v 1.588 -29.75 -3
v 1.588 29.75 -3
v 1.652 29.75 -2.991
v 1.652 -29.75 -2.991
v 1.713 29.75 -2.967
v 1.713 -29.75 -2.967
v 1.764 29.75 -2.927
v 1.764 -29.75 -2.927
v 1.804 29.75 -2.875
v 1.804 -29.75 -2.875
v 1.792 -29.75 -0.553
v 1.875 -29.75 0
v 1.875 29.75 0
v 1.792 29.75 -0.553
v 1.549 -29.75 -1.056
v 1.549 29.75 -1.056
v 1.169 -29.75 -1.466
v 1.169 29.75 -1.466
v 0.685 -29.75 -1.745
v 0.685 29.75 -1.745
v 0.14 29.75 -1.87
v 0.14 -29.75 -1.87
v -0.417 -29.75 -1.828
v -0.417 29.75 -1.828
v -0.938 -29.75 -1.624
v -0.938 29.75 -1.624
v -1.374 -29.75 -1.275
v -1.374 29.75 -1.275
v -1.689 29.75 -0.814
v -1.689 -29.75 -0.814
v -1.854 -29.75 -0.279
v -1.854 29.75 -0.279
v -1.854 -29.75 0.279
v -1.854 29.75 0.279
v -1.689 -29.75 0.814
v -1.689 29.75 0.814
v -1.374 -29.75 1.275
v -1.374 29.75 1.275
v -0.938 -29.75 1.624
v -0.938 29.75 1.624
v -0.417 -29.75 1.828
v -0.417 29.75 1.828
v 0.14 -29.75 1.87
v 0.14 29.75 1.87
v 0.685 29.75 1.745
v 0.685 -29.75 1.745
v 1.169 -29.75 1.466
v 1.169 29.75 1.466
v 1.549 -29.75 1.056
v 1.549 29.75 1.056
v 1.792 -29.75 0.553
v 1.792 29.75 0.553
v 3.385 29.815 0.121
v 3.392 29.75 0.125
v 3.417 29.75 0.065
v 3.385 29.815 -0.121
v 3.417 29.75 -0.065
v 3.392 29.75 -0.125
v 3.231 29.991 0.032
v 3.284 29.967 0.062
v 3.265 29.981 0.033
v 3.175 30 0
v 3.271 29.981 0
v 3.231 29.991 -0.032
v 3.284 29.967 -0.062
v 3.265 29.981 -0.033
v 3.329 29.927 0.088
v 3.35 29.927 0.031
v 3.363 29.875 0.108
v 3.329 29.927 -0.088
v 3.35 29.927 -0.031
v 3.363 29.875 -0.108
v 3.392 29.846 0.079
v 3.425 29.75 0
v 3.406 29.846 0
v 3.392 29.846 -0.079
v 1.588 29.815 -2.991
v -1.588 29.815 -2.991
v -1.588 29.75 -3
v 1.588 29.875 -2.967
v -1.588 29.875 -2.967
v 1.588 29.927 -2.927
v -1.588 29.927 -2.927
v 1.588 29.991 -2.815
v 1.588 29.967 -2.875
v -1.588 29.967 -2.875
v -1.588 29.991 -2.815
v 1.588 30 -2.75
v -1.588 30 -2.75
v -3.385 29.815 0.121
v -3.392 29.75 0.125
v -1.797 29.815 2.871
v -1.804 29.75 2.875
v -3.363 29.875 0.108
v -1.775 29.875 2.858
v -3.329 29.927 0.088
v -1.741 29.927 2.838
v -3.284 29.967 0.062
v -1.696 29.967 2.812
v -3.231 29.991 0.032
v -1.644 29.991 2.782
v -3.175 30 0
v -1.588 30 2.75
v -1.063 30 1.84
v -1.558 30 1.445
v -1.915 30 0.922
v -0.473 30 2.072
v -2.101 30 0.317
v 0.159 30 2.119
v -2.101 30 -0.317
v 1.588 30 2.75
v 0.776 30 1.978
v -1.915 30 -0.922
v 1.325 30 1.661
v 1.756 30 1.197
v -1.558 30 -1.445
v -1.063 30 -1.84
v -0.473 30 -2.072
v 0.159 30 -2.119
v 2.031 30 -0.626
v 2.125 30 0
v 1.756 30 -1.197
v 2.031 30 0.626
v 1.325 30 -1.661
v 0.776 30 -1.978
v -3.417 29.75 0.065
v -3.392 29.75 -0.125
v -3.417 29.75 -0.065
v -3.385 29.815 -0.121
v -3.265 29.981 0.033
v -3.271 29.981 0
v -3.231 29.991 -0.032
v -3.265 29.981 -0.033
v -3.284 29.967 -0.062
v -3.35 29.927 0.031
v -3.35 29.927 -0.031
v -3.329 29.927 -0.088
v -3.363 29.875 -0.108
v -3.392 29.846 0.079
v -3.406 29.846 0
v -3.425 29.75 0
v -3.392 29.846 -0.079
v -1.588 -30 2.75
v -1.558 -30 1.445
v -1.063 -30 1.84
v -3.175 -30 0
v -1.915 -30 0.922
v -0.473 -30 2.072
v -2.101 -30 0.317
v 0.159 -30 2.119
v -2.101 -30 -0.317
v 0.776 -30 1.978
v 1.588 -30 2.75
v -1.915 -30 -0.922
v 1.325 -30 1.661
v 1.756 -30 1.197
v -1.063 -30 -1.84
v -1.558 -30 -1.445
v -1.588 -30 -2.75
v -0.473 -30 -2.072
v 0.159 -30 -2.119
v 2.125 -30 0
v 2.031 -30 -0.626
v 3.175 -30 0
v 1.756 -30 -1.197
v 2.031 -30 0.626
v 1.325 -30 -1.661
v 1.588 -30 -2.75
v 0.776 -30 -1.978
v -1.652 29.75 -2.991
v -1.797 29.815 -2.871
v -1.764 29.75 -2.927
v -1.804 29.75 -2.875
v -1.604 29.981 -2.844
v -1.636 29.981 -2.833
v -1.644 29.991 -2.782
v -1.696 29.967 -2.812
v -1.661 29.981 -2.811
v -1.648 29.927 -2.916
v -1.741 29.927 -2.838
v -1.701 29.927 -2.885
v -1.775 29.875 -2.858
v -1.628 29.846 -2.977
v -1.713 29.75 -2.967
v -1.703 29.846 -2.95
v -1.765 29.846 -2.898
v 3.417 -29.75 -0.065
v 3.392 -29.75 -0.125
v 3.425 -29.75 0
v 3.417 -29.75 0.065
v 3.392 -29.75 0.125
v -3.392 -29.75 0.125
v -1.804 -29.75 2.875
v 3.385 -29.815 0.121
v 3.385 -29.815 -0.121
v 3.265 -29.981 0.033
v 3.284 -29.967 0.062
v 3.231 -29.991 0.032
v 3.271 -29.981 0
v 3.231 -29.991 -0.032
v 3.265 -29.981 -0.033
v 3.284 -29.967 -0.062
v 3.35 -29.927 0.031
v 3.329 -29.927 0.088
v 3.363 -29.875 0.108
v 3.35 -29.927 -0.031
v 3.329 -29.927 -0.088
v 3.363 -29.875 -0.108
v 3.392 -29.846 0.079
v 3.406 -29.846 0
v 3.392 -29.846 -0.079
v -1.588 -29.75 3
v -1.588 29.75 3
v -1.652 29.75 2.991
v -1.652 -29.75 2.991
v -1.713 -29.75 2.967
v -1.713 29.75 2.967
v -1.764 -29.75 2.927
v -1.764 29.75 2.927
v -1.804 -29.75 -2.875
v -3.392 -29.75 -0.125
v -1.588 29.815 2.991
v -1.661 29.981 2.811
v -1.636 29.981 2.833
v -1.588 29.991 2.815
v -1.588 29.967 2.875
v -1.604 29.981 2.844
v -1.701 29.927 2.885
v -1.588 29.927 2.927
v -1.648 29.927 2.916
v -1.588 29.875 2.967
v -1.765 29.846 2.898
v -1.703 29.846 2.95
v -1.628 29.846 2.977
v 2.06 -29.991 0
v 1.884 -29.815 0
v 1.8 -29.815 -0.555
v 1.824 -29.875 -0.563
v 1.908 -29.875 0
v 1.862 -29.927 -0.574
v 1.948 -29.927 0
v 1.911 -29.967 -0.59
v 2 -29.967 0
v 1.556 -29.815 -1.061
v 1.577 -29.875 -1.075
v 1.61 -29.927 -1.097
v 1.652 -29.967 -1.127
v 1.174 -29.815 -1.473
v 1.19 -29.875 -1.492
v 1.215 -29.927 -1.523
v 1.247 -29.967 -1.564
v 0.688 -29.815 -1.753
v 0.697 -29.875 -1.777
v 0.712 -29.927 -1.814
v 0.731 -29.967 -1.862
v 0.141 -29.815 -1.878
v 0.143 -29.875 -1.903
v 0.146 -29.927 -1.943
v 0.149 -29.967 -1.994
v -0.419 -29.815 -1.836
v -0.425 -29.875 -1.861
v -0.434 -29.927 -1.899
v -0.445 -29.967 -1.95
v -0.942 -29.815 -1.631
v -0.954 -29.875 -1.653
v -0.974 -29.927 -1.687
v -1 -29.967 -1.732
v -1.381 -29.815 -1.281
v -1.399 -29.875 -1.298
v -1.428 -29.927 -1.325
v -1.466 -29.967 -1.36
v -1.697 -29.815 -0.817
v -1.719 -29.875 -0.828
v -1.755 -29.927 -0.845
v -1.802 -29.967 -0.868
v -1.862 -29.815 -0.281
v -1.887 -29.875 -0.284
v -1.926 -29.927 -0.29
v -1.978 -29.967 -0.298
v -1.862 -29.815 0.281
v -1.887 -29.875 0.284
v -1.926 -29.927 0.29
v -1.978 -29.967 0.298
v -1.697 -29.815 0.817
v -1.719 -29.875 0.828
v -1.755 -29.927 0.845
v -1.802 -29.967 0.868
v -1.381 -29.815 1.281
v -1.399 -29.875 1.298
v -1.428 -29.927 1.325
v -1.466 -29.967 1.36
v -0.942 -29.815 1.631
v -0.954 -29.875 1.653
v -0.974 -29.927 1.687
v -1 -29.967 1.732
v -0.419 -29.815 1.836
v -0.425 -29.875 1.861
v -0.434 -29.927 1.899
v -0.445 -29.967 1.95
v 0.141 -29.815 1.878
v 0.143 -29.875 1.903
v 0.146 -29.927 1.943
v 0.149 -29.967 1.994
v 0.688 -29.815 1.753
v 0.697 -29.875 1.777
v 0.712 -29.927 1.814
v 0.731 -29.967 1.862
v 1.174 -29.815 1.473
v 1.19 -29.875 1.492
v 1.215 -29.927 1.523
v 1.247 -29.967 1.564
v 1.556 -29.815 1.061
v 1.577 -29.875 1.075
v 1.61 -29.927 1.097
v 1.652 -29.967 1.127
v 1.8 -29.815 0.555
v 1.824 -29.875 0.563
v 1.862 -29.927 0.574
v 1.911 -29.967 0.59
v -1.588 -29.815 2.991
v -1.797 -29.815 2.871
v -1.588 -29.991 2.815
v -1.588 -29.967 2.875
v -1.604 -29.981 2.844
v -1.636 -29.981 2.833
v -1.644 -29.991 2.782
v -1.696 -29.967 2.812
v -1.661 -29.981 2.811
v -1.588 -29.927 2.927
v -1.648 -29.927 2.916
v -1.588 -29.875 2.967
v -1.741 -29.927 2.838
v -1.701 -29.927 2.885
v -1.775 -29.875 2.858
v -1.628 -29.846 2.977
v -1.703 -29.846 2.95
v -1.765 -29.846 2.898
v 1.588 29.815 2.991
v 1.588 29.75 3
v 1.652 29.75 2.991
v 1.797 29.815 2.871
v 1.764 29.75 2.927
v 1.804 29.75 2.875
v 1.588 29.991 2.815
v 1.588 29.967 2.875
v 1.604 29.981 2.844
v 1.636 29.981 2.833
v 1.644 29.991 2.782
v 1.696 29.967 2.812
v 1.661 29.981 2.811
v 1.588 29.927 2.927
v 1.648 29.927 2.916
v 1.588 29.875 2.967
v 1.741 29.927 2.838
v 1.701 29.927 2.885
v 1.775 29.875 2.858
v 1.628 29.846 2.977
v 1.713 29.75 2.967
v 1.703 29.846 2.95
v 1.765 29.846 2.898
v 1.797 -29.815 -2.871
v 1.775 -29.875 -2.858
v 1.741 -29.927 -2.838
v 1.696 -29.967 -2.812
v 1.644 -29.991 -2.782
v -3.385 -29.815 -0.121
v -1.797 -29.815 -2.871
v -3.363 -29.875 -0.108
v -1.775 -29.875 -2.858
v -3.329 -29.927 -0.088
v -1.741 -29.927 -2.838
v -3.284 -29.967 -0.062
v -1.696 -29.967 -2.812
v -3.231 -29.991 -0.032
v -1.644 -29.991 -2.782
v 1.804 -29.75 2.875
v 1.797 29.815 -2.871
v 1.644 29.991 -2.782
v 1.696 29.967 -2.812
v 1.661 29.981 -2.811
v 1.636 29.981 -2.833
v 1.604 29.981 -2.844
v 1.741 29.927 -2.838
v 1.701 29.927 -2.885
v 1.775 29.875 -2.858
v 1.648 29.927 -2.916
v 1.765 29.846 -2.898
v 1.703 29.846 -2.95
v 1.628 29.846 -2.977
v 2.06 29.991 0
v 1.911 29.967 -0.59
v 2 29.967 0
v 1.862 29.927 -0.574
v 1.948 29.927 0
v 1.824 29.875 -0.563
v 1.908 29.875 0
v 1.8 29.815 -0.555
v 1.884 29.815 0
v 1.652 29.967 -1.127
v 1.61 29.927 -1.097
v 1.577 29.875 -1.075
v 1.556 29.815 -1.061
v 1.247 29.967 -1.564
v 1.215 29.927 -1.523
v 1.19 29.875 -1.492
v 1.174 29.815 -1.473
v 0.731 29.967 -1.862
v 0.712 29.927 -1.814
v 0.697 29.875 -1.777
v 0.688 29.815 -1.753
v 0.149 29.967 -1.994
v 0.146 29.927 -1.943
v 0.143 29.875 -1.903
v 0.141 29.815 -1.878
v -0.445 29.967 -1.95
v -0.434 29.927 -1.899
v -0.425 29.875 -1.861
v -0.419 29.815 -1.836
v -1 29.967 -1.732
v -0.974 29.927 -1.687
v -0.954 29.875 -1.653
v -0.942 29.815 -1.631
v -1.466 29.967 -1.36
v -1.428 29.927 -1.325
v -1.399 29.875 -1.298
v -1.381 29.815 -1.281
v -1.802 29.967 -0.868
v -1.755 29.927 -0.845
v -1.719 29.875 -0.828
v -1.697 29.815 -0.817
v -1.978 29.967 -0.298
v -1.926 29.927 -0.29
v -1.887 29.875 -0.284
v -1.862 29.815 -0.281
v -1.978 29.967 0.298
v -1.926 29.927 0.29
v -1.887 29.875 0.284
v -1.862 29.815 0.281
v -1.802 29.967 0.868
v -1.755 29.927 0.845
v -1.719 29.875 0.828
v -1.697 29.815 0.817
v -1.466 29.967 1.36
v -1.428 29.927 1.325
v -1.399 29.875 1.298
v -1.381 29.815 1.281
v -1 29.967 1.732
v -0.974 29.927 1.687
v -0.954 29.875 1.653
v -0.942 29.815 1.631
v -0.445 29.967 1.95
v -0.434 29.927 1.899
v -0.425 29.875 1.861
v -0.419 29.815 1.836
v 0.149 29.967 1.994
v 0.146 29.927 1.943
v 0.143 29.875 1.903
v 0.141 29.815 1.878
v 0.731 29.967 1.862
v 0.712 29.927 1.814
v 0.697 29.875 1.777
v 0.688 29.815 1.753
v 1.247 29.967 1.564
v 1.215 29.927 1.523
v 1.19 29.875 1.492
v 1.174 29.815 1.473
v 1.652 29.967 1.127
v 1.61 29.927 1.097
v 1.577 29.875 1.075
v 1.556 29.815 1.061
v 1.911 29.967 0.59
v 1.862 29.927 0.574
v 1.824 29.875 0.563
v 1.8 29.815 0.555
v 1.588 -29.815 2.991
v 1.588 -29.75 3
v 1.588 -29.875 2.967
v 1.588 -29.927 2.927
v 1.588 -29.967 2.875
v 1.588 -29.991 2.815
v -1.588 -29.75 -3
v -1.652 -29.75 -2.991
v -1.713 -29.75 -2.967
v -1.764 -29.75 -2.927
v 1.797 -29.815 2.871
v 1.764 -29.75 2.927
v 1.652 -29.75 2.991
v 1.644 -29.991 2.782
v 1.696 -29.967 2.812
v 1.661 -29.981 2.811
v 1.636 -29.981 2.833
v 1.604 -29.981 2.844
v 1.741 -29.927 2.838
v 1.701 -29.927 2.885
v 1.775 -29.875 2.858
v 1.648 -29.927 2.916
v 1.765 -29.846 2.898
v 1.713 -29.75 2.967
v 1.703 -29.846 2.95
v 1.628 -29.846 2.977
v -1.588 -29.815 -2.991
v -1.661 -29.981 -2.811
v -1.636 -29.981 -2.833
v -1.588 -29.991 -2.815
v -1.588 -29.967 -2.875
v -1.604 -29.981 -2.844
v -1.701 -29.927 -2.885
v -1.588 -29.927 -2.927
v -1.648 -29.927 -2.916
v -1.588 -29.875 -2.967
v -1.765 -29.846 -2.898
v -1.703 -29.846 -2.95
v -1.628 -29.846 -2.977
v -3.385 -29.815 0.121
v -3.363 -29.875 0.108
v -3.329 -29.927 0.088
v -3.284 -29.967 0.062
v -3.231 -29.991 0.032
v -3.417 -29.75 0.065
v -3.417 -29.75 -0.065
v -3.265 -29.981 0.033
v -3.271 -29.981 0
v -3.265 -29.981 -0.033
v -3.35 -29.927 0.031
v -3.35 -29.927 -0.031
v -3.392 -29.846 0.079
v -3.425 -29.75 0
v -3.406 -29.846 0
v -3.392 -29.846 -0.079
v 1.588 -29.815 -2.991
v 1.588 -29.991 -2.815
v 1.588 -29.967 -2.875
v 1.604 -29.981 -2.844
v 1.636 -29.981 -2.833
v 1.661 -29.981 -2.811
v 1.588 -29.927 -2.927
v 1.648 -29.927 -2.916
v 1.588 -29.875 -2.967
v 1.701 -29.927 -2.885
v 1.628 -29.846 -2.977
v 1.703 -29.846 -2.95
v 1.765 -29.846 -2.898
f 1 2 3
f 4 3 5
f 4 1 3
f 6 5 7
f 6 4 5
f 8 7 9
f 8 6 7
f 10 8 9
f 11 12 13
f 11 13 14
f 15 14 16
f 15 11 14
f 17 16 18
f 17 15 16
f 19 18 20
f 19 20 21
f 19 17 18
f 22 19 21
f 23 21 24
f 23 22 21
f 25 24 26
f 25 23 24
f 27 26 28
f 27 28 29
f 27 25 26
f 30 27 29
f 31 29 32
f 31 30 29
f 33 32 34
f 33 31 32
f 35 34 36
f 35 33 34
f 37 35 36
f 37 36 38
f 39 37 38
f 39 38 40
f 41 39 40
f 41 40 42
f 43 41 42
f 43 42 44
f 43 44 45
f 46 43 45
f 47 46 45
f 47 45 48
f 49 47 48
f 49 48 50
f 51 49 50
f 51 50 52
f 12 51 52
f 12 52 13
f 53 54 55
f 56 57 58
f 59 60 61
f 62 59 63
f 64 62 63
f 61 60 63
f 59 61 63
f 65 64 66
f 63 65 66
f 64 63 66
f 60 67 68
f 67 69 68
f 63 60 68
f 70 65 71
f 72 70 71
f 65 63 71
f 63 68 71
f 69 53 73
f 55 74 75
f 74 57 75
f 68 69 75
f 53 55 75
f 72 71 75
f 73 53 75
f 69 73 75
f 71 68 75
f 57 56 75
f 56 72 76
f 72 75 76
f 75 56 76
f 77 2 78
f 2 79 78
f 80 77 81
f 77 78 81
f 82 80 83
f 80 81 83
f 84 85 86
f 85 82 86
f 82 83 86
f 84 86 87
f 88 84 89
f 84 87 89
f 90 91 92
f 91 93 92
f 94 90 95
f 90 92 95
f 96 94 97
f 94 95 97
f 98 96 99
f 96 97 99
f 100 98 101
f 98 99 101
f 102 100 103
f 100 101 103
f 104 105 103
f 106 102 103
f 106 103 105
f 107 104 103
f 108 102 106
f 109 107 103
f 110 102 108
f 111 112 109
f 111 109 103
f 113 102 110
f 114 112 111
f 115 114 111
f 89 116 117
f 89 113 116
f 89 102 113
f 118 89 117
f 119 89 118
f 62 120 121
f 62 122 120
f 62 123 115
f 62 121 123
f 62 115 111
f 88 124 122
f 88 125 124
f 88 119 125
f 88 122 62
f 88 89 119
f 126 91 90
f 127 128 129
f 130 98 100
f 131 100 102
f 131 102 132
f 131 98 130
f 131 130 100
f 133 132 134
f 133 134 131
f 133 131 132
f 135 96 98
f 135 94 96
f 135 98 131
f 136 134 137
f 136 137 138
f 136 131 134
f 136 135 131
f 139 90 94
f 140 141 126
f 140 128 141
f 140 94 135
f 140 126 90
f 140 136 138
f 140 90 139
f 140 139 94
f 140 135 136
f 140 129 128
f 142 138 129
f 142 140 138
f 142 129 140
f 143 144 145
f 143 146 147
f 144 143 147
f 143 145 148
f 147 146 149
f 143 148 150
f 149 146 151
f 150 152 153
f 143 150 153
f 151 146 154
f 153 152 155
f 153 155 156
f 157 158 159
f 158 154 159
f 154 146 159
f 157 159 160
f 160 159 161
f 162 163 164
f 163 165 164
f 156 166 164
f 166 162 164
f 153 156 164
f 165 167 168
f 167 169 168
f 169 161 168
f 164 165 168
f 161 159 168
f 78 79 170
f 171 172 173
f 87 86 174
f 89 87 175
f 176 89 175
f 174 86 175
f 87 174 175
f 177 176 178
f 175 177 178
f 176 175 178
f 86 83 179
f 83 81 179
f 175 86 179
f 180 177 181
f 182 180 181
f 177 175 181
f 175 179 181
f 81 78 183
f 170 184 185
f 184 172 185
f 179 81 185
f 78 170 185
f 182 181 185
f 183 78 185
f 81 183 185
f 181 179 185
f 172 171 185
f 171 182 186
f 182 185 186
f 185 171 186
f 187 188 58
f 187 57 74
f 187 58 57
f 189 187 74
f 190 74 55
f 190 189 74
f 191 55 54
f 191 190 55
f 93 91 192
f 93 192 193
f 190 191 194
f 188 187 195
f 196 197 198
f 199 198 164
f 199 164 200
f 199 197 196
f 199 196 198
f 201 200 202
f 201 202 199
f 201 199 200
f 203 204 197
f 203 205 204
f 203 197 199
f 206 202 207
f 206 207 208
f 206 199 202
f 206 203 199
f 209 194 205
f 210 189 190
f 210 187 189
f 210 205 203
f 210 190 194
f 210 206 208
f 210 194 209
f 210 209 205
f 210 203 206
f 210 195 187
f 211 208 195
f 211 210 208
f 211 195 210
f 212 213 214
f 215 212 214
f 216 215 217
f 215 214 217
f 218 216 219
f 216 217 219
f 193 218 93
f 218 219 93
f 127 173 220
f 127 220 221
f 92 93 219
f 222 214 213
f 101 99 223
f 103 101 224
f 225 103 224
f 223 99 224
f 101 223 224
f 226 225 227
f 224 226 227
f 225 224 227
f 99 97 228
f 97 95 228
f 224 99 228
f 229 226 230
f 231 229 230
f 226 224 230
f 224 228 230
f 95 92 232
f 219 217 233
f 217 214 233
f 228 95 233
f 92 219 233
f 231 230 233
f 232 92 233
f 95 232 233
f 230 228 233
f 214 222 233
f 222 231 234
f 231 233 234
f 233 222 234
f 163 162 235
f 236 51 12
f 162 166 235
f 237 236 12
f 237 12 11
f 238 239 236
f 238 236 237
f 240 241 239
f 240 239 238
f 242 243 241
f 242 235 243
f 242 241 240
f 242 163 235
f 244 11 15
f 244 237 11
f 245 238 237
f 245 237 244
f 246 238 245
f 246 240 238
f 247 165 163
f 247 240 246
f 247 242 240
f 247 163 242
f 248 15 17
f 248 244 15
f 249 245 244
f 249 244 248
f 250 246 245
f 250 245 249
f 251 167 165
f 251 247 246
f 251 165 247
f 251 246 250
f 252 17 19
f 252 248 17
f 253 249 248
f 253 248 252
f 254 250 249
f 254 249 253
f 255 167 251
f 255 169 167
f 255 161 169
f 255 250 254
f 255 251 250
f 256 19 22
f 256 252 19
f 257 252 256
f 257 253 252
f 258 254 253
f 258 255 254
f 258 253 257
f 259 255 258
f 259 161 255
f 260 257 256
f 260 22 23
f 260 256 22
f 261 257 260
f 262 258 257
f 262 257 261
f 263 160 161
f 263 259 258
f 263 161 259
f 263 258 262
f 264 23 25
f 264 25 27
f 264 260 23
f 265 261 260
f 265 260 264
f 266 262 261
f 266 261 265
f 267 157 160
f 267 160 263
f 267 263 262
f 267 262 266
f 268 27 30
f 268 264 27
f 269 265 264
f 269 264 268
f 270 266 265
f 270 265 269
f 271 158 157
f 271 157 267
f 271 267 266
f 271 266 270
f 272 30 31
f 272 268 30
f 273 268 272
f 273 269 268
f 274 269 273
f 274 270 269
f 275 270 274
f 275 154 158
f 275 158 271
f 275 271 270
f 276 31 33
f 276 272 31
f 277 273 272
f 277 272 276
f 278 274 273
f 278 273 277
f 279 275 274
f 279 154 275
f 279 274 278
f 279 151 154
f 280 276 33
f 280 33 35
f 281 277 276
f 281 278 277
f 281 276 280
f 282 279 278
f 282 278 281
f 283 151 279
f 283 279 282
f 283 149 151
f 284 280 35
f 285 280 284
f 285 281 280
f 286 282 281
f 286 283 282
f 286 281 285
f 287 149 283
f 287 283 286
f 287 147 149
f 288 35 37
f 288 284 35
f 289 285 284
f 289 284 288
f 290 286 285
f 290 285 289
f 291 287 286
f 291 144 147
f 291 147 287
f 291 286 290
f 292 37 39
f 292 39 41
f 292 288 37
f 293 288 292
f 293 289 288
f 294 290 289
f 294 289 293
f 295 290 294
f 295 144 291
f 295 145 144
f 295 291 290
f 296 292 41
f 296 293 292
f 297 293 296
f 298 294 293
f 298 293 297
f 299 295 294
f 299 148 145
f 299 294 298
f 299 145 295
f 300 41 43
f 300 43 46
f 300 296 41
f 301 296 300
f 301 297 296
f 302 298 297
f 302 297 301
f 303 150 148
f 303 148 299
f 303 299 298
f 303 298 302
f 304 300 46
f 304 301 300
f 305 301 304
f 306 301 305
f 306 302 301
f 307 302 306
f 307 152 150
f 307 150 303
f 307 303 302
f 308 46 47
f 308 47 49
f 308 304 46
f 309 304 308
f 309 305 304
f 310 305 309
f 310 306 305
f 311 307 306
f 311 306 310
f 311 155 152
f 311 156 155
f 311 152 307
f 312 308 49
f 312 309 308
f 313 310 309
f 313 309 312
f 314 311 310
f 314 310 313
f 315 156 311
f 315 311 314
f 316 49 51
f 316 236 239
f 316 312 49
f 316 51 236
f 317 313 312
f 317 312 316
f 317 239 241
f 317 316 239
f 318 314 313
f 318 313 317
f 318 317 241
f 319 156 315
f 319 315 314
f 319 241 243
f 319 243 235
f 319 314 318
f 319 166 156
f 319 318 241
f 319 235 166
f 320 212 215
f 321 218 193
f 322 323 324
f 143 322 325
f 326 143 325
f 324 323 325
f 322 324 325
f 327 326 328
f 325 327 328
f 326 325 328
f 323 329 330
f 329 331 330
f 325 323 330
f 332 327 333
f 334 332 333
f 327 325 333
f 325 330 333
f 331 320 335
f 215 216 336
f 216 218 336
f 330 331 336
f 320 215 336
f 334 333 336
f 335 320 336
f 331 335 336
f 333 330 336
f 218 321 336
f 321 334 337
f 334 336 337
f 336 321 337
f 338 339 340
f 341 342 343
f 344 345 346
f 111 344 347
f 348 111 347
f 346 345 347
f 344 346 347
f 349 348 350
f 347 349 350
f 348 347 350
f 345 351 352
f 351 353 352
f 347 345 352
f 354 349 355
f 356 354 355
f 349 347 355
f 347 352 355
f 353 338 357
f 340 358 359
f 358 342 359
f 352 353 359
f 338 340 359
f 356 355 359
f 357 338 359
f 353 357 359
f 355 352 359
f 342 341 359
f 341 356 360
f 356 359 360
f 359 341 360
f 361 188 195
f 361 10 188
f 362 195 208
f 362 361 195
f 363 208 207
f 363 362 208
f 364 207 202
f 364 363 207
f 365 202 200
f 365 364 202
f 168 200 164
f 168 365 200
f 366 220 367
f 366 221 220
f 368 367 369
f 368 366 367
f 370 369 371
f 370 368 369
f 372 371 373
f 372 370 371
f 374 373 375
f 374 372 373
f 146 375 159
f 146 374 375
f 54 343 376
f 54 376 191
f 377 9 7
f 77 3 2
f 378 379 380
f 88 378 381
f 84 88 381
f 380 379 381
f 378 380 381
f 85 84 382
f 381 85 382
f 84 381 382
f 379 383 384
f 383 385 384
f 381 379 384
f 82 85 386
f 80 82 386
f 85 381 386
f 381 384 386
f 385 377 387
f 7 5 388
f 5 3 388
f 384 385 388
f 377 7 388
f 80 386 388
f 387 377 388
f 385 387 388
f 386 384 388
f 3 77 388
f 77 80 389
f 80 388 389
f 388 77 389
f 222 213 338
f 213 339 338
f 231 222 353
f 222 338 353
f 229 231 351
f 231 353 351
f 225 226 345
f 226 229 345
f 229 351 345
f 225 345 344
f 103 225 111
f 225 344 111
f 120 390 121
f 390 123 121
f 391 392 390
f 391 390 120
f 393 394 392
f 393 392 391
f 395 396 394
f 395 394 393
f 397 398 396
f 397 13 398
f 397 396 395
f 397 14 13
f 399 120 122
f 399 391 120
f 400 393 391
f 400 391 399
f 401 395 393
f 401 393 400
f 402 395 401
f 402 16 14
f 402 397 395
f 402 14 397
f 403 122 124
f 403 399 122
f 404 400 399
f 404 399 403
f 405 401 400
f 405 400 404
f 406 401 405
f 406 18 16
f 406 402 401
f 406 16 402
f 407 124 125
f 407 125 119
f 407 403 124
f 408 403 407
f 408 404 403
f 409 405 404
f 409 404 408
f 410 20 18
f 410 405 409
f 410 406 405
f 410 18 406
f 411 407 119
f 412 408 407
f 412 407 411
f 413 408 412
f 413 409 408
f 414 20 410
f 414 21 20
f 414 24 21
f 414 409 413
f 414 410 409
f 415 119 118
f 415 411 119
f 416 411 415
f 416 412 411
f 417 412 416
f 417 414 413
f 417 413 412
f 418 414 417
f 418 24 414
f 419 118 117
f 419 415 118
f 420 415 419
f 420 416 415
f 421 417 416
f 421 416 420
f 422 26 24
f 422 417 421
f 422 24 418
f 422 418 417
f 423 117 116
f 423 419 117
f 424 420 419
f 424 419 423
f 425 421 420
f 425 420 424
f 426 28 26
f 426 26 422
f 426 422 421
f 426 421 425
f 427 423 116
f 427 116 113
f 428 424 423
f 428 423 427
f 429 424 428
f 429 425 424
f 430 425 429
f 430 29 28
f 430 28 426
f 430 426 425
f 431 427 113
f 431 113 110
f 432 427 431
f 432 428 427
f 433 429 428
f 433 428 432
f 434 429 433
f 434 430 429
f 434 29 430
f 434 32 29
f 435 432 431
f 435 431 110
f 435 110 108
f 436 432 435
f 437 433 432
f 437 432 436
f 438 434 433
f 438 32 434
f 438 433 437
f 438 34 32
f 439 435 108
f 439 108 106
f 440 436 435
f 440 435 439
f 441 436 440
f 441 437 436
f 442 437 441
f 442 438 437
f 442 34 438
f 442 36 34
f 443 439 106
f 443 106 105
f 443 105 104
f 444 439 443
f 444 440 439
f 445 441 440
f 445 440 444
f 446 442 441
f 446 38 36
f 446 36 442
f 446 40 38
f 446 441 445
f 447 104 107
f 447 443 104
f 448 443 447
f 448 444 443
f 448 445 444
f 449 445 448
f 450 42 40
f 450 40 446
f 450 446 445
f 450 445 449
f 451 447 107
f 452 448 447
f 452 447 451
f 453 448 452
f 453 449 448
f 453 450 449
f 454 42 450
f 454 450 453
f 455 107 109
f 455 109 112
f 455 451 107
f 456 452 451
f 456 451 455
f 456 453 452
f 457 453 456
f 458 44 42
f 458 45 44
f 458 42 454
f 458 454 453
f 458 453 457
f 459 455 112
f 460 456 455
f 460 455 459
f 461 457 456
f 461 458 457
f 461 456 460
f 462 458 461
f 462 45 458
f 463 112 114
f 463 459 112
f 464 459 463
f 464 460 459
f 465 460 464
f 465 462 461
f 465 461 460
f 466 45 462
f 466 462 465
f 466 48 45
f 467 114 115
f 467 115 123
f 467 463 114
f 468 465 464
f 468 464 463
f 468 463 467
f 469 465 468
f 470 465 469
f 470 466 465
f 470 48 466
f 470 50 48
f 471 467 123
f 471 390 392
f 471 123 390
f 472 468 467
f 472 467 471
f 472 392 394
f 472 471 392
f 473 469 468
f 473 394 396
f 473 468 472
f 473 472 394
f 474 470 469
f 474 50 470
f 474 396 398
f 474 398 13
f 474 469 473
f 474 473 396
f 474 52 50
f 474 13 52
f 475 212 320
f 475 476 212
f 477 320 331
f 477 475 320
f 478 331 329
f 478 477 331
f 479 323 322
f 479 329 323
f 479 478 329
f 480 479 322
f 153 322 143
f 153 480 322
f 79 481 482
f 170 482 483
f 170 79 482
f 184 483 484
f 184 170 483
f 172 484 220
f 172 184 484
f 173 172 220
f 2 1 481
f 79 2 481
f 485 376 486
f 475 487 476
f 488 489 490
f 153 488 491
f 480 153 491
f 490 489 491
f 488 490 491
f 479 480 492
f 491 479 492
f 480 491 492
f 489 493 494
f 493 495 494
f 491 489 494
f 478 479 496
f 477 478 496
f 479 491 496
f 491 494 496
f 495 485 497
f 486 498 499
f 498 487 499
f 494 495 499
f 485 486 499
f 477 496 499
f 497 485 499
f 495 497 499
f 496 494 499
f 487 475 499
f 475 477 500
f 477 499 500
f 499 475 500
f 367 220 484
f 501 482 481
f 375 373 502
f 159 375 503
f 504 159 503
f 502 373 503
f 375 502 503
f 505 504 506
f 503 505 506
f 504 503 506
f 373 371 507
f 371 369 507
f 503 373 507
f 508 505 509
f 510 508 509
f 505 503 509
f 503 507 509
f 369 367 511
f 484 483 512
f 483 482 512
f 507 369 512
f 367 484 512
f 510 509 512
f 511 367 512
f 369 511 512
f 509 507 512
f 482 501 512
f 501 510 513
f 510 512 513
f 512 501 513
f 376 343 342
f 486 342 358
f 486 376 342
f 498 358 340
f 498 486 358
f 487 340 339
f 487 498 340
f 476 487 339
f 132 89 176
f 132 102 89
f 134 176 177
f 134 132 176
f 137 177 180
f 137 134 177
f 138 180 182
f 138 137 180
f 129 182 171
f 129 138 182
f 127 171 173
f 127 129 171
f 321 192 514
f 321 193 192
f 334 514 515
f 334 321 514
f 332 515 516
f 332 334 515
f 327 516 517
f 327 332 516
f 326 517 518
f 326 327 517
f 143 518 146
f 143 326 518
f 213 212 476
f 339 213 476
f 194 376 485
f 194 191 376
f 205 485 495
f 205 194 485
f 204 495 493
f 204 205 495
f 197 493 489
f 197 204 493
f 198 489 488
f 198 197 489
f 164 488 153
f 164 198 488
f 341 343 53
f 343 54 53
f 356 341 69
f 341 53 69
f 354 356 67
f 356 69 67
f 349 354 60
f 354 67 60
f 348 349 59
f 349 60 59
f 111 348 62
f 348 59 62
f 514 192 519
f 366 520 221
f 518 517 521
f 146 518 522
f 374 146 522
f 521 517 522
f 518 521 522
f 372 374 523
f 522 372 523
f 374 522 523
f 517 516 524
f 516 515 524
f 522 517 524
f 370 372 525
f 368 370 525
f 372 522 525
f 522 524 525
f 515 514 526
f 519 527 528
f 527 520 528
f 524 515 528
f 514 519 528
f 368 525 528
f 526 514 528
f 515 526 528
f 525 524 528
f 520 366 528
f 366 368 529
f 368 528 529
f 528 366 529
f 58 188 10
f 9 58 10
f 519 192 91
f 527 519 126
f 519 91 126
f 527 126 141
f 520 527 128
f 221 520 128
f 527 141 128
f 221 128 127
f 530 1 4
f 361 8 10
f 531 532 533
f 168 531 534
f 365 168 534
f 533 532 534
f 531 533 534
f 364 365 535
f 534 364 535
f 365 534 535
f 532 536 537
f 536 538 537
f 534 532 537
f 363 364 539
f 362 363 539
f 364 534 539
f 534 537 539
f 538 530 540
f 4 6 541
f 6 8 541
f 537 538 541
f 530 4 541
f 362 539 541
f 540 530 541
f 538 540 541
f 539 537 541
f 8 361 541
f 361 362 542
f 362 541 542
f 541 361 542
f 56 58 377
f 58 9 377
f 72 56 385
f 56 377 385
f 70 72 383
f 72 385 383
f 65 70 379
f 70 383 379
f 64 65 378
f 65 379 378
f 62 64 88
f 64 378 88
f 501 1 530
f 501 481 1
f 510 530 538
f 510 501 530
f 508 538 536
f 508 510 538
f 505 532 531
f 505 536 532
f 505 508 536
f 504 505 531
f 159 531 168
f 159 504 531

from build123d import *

# Parameters (mm, degrees)
SKETCH1_R           = 1.875
BOSS_EXTRUDE1_DEPTH = 30
FILLET1_R           = 0.25


with BuildPart() as part:
    # Sketch1 → Boss-Extrude1 (new body, symmetric)
    with BuildSketch(Plane(origin=(0, 0, 0), x_dir=(1, 0, 0), z_dir=(0, 1, 0))):
        Polygon((1.732050808, 3), (-1.732050808, 3), (-3.464101615, 0), (-1.732050808, -3), (1.732050808, -3), (3.464101615, 0), align=None)
        Circle(SKETCH1_R, mode=Mode.SUBTRACT)
    extrude(amount=BOSS_EXTRUDE1_DEPTH, both=True)

    # Fillet1
    fillet1_edges = [part.edges().sort_by_distance(p)[0] for p in [
        (-2.598076211, 30, -1.5),
        (3.464101615, 0, 0),
        (1.732050808, 0, 3),
        (-1.732050808, 0, 3),
        (-3.464101615, 0, 0),
        (-1.732050808, 0, -3),
        (1.732050808, 0, -3),
        (-2.598076211, 30, 1.5),
        (0, 30, 3),
        (-1.875, -30, 0),
        (-1.875, 30, 0),
        (2.598076211, 30, 1.5),
        (2.598076211, 30, -1.5),
        (2.598076211, -30, 1.5),
        (0, -30, 3),
        (-2.598076211, -30, 1.5),
        (0, 30, -3),
        (-2.598076211, -30, -1.5),
        (0, -30, -3),
        (2.598076211, -30, -1.5),
    ]]
    fillet(fillet1_edges, radius=FILLET1_R)


solid = part.part
